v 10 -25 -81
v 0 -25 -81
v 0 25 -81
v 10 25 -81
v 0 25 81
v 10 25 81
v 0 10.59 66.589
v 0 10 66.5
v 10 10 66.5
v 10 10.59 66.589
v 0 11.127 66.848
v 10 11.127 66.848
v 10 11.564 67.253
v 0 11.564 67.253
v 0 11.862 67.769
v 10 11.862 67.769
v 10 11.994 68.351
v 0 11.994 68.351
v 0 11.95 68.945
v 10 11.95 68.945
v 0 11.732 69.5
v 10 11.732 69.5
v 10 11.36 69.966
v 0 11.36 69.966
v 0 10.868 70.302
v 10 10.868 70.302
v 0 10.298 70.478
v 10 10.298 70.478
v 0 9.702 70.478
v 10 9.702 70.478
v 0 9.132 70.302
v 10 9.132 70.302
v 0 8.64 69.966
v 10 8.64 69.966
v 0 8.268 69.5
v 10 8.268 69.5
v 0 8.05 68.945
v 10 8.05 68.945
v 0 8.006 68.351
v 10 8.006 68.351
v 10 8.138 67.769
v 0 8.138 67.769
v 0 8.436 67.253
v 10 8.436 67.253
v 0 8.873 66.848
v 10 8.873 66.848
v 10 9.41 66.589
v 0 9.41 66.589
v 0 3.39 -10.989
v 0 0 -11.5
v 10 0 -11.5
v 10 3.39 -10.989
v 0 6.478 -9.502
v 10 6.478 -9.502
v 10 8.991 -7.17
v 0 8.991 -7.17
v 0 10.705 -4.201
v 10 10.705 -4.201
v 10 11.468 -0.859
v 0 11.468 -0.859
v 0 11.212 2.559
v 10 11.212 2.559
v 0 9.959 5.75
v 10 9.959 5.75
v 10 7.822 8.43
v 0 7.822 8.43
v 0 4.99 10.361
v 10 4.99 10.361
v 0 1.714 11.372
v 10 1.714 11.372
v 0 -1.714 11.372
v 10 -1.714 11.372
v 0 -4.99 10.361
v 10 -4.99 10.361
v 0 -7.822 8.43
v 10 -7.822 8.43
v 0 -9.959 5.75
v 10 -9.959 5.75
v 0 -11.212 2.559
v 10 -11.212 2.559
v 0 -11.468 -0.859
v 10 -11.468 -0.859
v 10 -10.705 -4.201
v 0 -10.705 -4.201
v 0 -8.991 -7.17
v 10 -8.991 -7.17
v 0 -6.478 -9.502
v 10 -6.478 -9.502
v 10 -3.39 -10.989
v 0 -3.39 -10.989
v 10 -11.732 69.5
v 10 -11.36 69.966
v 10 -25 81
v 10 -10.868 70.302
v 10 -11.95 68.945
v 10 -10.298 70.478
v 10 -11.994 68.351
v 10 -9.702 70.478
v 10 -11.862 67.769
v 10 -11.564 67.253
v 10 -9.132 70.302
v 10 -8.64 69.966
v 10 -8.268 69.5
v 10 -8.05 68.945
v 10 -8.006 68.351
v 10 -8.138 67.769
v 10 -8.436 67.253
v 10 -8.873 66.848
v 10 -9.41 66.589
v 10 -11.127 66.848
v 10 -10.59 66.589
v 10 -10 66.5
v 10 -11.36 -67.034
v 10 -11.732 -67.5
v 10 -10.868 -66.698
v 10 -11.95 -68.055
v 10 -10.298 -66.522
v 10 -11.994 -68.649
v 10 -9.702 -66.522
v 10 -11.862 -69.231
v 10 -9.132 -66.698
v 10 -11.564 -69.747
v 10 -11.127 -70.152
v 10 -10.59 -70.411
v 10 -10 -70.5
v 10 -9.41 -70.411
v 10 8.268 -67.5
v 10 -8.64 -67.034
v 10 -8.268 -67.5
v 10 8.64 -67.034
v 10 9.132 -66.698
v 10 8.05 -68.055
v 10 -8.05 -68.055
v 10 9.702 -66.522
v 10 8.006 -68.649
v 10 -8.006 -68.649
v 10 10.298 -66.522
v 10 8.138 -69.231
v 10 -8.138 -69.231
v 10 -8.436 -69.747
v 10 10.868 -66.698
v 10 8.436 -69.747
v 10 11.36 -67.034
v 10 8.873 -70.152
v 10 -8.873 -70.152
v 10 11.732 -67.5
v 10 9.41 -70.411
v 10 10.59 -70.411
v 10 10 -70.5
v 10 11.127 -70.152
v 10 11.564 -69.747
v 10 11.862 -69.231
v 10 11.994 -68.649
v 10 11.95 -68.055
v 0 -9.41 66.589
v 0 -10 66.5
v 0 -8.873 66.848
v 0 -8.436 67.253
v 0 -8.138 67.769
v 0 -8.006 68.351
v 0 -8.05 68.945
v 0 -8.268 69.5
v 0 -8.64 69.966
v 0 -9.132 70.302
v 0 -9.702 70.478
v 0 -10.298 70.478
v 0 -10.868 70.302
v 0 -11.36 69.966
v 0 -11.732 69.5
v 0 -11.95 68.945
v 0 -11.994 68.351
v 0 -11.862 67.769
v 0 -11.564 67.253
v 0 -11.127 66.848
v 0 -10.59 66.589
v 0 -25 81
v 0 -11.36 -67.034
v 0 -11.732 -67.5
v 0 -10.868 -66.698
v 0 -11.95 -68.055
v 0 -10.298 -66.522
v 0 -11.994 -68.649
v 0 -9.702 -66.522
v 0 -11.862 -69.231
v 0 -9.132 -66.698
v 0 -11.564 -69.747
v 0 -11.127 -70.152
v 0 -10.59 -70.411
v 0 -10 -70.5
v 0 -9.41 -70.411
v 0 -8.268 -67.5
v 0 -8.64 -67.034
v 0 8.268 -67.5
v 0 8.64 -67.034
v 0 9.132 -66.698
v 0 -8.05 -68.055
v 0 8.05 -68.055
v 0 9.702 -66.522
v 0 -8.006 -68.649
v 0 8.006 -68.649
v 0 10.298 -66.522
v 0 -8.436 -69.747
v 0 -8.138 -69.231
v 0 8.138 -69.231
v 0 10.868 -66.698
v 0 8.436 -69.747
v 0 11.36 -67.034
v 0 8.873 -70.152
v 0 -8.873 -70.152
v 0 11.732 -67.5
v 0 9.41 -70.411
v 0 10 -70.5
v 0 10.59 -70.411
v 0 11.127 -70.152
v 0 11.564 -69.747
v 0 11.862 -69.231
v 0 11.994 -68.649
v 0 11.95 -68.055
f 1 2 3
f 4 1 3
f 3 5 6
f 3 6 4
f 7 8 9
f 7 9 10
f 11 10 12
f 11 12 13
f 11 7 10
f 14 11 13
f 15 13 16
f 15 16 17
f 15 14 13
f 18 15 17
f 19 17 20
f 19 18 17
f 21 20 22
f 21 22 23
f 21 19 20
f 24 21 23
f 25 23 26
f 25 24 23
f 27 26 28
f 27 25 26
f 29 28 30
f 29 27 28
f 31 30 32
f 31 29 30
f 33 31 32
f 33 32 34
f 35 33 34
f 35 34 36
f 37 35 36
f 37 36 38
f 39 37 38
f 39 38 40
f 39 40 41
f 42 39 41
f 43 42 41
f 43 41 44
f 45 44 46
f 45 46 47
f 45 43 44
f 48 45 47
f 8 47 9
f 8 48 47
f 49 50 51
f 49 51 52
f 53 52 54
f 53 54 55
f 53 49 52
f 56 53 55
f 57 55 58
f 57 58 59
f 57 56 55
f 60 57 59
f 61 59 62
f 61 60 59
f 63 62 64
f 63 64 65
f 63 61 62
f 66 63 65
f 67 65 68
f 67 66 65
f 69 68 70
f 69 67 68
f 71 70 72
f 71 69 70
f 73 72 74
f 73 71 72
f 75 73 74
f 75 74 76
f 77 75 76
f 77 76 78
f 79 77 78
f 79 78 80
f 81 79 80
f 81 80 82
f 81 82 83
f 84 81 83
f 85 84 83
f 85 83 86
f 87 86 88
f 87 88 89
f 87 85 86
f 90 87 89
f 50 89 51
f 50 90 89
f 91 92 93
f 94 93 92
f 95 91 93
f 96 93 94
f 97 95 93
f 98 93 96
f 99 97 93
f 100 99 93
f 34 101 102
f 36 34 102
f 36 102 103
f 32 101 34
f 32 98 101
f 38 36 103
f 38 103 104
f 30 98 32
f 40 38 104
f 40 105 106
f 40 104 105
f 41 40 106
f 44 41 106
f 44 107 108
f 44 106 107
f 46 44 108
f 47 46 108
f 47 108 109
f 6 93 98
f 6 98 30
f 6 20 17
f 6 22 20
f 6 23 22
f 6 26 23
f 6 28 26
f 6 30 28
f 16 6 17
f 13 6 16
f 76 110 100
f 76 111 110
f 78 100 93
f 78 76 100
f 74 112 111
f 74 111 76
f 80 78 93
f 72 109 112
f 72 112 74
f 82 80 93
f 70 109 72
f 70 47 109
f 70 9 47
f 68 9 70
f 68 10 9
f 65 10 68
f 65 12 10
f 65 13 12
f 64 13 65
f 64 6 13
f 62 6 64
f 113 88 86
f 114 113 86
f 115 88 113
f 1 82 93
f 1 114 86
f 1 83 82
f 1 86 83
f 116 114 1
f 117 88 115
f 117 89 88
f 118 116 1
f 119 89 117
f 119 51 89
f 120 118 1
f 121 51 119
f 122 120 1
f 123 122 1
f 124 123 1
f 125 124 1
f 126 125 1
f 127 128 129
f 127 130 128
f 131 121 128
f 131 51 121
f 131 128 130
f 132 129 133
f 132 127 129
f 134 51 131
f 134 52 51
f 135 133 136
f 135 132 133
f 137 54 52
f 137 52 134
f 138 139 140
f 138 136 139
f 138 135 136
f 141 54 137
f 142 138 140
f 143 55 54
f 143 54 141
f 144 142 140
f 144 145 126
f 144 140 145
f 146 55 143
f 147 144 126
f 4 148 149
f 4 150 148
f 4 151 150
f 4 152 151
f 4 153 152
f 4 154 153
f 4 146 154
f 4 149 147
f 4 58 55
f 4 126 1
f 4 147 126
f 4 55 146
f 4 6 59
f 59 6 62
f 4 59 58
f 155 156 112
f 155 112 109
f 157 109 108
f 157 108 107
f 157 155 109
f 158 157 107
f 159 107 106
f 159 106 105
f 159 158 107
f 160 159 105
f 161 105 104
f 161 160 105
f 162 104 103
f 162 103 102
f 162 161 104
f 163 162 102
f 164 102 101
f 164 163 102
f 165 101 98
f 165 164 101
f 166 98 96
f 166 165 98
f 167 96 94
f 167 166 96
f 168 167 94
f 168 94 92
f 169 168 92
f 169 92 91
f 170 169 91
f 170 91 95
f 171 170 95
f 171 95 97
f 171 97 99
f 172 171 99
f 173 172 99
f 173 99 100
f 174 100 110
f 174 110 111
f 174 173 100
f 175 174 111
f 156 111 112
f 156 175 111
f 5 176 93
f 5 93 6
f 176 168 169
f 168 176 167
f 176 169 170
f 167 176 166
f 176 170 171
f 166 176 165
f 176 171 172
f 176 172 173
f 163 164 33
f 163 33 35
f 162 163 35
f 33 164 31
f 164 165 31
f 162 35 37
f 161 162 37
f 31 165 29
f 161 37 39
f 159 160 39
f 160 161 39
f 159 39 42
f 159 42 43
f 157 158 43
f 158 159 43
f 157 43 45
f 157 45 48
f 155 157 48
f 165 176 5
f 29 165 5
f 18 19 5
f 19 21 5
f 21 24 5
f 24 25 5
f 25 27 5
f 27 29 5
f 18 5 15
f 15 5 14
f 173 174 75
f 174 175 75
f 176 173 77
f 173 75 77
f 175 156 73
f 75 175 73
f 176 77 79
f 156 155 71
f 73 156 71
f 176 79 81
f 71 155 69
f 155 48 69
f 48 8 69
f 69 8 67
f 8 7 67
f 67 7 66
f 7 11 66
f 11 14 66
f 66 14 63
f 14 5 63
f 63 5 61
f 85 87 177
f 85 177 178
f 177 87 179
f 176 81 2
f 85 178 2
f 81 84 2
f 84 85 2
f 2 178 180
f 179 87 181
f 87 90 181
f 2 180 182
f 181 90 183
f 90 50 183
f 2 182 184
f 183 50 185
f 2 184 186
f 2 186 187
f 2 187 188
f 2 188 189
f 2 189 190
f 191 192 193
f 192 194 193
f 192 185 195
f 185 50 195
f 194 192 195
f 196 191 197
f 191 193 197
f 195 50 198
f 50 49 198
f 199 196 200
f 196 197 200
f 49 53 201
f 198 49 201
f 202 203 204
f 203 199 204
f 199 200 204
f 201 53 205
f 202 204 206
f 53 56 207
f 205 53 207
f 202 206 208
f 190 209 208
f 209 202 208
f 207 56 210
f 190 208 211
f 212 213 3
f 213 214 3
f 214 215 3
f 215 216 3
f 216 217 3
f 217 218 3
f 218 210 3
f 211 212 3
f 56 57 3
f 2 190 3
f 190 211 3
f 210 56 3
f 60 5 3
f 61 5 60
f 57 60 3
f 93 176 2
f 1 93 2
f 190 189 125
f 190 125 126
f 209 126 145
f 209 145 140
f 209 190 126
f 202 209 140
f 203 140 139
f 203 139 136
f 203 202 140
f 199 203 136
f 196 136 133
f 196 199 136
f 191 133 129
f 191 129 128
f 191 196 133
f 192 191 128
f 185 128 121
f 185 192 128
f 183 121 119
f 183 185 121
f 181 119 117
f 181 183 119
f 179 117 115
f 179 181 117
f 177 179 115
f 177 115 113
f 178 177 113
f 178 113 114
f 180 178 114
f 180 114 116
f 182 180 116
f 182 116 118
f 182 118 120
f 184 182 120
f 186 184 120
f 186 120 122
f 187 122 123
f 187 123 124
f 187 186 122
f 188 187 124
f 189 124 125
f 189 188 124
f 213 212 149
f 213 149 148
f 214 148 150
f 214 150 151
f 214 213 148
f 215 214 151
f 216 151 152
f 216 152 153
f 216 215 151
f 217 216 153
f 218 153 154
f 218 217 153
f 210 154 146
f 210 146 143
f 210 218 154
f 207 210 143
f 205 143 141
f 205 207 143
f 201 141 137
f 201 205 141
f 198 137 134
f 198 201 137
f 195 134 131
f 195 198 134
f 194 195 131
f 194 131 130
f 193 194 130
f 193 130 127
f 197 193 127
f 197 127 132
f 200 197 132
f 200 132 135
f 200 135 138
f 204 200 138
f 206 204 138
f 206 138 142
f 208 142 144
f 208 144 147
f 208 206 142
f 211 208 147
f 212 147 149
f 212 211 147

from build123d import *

# Parameters (mm, degrees)
SKETCH1_W           = 112
SKETCH1_H           = 50
SKETCH1_R           = 11.5
SKETCH1_W_2         = 25
SKETCH1_R_2         = 2
BOSS_EXTRUDE1_DEPTH = 10


with BuildPart() as part:
    # Sketch1 → Boss-Extrude1 (new body)
    # profile 1 of 3: a face of its own
    with BuildSketch(Plane(origin=(0, 0, 0), x_dir=(0, 0, -1), z_dir=(1, 0, 0))):
        Rectangle(SKETCH1_W, SKETCH1_H)
        Circle(SKETCH1_R, mode=Mode.SUBTRACT)
    # profile 2 of 3: a face of its own
    with BuildSketch(Plane(origin=(0, 0, 0), x_dir=(0, 0, -1), z_dir=(1, 0, 0))):
        with Locations((-68.5, 0)):
            Rectangle(SKETCH1_W_2, SKETCH1_H)
        with Locations((-68.5, -10)):
            Circle(SKETCH1_R_2, mode=Mode.SUBTRACT)
        with Locations((-68.5, 10)):
            Circle(SKETCH1_R_2, mode=Mode.SUBTRACT)
    # profile 3 of 3: a face of its own
    with BuildSketch(Plane(origin=(0, 0, 0), x_dir=(0, 0, -1), z_dir=(1, 0, 0))):
        with Locations((68.5, 0)):
            Rectangle(SKETCH1_W_2, SKETCH1_H)
        with Locations((68.5, -10)):
            Circle(SKETCH1_R_2, mode=Mode.SUBTRACT)
        with Locations((68.5, 10)):
            Circle(SKETCH1_R_2, mode=Mode.SUBTRACT)
    extrude(amount=BOSS_EXTRUDE1_DEPTH)


solid = part.part
